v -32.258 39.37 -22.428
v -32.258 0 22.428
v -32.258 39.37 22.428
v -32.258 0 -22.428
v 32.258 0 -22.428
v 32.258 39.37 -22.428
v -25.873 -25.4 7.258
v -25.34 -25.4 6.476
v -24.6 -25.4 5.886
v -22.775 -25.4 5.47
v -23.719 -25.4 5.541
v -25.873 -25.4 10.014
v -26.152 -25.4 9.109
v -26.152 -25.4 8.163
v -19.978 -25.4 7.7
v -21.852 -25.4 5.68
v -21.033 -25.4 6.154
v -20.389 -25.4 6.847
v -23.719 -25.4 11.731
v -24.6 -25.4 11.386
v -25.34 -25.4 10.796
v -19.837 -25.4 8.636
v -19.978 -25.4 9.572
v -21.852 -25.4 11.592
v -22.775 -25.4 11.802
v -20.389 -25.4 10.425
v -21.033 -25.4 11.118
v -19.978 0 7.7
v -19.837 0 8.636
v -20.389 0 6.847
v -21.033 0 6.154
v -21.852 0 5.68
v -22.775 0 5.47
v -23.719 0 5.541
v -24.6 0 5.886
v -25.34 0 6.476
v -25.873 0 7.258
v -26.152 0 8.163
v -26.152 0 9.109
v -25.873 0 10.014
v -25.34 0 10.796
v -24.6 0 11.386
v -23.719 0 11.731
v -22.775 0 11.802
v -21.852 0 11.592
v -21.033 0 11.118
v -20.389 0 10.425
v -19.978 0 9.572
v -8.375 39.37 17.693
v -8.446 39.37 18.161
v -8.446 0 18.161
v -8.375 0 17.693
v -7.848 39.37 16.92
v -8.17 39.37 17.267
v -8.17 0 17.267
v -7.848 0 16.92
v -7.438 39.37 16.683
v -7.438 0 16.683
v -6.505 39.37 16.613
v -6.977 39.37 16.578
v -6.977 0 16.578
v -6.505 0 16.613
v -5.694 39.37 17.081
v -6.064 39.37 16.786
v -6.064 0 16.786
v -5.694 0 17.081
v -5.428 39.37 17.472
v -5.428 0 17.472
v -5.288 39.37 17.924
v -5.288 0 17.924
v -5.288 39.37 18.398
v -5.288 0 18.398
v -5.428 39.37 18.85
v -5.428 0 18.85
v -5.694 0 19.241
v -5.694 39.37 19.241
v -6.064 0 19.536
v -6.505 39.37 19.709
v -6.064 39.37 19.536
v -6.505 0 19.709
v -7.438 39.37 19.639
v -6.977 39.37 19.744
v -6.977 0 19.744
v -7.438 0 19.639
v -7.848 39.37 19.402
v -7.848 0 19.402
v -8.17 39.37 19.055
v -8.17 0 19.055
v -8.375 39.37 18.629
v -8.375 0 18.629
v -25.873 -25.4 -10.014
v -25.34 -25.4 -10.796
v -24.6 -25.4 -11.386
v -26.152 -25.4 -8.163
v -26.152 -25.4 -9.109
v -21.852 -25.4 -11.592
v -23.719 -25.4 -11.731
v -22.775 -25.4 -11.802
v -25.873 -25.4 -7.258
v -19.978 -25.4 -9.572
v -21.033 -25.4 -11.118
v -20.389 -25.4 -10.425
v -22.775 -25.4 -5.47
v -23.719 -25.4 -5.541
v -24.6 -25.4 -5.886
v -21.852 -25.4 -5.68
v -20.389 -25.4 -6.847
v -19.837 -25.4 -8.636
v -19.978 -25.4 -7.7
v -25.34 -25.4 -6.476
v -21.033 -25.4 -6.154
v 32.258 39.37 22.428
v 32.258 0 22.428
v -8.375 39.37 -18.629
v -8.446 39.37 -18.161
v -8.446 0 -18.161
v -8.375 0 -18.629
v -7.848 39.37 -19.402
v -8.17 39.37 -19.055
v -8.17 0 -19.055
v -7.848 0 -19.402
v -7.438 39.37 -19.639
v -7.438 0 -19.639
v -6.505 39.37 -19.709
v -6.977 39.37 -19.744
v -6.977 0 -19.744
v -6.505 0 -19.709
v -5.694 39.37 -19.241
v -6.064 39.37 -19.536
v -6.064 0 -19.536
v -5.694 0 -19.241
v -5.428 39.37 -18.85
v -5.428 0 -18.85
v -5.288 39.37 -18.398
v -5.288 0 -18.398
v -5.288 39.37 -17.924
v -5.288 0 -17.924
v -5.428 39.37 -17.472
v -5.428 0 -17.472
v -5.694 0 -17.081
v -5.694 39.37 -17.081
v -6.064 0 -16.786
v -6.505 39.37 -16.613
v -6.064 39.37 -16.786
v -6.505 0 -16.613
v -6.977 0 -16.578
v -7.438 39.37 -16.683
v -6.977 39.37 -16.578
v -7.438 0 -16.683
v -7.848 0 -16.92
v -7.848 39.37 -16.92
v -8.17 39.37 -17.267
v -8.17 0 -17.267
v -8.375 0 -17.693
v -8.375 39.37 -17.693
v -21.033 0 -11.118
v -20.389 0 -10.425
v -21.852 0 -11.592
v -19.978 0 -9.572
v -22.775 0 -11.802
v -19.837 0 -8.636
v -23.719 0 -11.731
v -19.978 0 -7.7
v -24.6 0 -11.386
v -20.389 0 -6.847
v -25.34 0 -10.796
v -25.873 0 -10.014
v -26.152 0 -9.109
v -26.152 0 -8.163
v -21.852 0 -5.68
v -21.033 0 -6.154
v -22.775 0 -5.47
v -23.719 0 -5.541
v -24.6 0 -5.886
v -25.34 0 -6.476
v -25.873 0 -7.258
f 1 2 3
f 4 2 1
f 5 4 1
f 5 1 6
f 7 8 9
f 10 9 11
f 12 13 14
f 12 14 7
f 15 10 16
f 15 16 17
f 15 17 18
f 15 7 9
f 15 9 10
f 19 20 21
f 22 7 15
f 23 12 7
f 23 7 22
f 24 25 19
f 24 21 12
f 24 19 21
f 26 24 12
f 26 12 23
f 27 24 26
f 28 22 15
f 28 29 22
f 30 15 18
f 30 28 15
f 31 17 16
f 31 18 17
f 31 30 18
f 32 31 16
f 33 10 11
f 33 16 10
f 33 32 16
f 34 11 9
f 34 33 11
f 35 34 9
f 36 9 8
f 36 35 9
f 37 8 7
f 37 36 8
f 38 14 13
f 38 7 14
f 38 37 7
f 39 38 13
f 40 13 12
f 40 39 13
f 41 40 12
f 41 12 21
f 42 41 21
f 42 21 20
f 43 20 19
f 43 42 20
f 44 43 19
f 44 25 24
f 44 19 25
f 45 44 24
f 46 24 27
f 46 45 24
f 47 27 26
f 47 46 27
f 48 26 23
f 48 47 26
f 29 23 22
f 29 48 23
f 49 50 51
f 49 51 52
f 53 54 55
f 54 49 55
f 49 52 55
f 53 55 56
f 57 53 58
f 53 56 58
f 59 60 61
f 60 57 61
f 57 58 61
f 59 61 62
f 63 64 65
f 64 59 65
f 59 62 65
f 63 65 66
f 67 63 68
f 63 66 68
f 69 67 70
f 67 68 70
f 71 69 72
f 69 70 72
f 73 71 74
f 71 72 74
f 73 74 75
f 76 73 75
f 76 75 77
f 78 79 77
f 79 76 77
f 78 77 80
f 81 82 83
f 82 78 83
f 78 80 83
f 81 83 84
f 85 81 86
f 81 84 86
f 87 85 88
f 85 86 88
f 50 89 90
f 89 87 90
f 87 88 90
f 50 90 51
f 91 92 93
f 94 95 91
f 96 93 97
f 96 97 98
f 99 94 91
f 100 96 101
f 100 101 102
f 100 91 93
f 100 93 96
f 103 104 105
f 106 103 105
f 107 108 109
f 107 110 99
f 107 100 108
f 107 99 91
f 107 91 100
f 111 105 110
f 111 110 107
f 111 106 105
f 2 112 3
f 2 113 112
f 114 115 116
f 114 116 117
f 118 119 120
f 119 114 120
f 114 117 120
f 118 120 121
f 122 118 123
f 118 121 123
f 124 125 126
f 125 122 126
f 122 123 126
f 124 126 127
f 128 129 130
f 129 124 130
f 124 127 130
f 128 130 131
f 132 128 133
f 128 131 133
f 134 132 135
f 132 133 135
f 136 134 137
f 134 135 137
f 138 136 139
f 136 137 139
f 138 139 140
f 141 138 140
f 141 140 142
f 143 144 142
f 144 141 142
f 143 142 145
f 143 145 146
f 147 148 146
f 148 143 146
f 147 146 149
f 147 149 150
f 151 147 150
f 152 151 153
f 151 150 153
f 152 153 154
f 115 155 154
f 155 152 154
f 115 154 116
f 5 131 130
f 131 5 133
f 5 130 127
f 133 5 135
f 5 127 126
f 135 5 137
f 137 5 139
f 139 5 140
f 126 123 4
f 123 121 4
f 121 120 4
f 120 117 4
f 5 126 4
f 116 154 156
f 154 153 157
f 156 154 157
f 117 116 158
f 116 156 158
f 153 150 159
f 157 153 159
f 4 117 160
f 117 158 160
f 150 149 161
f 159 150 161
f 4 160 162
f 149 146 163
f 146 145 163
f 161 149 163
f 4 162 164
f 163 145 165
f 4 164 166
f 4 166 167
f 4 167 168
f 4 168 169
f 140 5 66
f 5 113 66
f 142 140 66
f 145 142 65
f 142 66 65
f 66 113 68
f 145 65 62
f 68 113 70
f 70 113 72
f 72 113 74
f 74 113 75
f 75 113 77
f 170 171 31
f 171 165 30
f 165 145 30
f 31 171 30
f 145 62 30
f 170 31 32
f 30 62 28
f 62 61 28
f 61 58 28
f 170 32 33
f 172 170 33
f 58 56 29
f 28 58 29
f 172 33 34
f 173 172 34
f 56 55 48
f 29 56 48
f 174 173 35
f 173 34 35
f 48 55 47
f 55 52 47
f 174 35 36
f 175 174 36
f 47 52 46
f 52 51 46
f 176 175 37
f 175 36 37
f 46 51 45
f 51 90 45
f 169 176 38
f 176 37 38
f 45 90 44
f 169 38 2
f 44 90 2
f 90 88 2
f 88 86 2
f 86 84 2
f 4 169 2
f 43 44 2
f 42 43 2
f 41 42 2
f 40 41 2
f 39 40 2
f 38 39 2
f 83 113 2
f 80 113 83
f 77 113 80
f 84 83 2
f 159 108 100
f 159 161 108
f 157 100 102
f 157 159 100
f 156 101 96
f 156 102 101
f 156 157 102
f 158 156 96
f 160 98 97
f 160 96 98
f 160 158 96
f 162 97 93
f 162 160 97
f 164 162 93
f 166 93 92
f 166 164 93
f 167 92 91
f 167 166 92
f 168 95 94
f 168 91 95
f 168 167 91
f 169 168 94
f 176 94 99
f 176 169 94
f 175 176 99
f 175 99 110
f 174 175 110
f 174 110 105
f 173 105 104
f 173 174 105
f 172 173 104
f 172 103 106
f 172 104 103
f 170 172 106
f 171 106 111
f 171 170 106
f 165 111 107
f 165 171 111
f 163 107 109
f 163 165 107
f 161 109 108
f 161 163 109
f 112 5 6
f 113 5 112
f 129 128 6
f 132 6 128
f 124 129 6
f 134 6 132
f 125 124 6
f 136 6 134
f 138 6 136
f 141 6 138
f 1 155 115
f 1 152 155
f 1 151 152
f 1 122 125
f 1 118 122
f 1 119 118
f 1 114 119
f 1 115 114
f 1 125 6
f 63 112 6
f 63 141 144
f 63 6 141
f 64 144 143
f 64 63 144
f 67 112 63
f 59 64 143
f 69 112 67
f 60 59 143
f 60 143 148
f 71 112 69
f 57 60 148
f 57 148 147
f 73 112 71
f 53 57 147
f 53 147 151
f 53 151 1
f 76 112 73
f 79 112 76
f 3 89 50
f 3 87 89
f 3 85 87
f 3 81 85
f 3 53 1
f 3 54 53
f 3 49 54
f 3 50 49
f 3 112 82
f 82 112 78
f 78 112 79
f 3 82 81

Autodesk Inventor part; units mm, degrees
ref_plane "YZ Plane" through (0, 0, 0) normal (1, 0, 0) x (0, 1, 0)
ref_plane "XZ Plane" through (0, 0, 0) normal (0, 1, 0) x (-1, 0, 0)
ref_plane "XY Plane" through (0, 0, 0) normal (0, 0, 1) x (1, 0, 0)
sketch "Sketch1" plane through (0, 0, 0) normal (0, 1, 0) x (-1, 0, 0)
  line L0 (32.258, -22.4282) -> (-32.258, -22.4282)
  line L1 (-32.258, -22.4282) -> (-32.258, 22.4282)
  line L2 (-32.258, 22.4282) -> (32.258, 22.4282)
  line L3 (32.258, 22.4282) -> (32.258, -22.4282)
  circle A0 centre (6.858, -18.161) radius 1.5875
  circle A1 centre (6.858, 18.161) radius 1.5875
  line L4 (6.858, -18.161) -> (6.858, 18.161) construction
  point P0 (0, 0)
  point P1 (32.258, 0)
  point P2 (0, -22.4282)
  point P3 (6.858, 0)
  dimension "d0" = 64.516
  dimension "d1" = 44.8564
  dimension "d2" = 3.175
  dimension "d3" = 25.4
  dimension "d4" = 39.116
  dimension "d15" = 36.322
extrude "Extrusion1" add sketch "Sketch1" along normal blind 39.37
sketch "Sketch2" plane through (0, 39.37, 0) normal (0, 1, 0) x (1, 0, 0)
  line L0 (-24.1562, -22.4282) -> (-24.1562, 22.4282) construction
  line L1 (-24.1562, 22.4282) -> (-18.3585, 22.4282) construction
  line L2 (-18.3585, 22.4282) -> (-18.3585, -22.4282) construction
  line L3 (-18.3585, -22.4282) -> (-24.1562, -22.4282) construction
  line L4 (32.258, 22.4282) -> (-32.258, 22.4282) projected
  line L5 (-32.258, -22.4282) -> (32.258, -22.4282) projected
  point P0 (0, 0)
sketch "Sketch4" plane through (0, 0, 0) normal (0, -1, 0) x (1, 0, 0)
  circle A0 centre (-23.0124, -8.636) radius 3.175
  circle A1 centre (-23.0124, 8.636) radius 3.175
  line L0 (-32.258, -22.4282) -> (-32.258, 22.4282) projected
  circle A2 centre (-6.858, -18.161) radius 1.5875 projected
  line L1 (-23.0124, -8.636) -> (-23.0124, 8.636) construction
  point P0 (0, 0)
  point P1 (-23.0124, 0)
  dimension "d11" = 17.272
  dimension "d12" = 9.2456
  dimension "d13" = 6.35
  dimension "d14" = 25.4
extrude "Extrusion2" add sketch "Sketch4" along normal blind 25.4 contours A0 | A1
properties part number "Pump"
